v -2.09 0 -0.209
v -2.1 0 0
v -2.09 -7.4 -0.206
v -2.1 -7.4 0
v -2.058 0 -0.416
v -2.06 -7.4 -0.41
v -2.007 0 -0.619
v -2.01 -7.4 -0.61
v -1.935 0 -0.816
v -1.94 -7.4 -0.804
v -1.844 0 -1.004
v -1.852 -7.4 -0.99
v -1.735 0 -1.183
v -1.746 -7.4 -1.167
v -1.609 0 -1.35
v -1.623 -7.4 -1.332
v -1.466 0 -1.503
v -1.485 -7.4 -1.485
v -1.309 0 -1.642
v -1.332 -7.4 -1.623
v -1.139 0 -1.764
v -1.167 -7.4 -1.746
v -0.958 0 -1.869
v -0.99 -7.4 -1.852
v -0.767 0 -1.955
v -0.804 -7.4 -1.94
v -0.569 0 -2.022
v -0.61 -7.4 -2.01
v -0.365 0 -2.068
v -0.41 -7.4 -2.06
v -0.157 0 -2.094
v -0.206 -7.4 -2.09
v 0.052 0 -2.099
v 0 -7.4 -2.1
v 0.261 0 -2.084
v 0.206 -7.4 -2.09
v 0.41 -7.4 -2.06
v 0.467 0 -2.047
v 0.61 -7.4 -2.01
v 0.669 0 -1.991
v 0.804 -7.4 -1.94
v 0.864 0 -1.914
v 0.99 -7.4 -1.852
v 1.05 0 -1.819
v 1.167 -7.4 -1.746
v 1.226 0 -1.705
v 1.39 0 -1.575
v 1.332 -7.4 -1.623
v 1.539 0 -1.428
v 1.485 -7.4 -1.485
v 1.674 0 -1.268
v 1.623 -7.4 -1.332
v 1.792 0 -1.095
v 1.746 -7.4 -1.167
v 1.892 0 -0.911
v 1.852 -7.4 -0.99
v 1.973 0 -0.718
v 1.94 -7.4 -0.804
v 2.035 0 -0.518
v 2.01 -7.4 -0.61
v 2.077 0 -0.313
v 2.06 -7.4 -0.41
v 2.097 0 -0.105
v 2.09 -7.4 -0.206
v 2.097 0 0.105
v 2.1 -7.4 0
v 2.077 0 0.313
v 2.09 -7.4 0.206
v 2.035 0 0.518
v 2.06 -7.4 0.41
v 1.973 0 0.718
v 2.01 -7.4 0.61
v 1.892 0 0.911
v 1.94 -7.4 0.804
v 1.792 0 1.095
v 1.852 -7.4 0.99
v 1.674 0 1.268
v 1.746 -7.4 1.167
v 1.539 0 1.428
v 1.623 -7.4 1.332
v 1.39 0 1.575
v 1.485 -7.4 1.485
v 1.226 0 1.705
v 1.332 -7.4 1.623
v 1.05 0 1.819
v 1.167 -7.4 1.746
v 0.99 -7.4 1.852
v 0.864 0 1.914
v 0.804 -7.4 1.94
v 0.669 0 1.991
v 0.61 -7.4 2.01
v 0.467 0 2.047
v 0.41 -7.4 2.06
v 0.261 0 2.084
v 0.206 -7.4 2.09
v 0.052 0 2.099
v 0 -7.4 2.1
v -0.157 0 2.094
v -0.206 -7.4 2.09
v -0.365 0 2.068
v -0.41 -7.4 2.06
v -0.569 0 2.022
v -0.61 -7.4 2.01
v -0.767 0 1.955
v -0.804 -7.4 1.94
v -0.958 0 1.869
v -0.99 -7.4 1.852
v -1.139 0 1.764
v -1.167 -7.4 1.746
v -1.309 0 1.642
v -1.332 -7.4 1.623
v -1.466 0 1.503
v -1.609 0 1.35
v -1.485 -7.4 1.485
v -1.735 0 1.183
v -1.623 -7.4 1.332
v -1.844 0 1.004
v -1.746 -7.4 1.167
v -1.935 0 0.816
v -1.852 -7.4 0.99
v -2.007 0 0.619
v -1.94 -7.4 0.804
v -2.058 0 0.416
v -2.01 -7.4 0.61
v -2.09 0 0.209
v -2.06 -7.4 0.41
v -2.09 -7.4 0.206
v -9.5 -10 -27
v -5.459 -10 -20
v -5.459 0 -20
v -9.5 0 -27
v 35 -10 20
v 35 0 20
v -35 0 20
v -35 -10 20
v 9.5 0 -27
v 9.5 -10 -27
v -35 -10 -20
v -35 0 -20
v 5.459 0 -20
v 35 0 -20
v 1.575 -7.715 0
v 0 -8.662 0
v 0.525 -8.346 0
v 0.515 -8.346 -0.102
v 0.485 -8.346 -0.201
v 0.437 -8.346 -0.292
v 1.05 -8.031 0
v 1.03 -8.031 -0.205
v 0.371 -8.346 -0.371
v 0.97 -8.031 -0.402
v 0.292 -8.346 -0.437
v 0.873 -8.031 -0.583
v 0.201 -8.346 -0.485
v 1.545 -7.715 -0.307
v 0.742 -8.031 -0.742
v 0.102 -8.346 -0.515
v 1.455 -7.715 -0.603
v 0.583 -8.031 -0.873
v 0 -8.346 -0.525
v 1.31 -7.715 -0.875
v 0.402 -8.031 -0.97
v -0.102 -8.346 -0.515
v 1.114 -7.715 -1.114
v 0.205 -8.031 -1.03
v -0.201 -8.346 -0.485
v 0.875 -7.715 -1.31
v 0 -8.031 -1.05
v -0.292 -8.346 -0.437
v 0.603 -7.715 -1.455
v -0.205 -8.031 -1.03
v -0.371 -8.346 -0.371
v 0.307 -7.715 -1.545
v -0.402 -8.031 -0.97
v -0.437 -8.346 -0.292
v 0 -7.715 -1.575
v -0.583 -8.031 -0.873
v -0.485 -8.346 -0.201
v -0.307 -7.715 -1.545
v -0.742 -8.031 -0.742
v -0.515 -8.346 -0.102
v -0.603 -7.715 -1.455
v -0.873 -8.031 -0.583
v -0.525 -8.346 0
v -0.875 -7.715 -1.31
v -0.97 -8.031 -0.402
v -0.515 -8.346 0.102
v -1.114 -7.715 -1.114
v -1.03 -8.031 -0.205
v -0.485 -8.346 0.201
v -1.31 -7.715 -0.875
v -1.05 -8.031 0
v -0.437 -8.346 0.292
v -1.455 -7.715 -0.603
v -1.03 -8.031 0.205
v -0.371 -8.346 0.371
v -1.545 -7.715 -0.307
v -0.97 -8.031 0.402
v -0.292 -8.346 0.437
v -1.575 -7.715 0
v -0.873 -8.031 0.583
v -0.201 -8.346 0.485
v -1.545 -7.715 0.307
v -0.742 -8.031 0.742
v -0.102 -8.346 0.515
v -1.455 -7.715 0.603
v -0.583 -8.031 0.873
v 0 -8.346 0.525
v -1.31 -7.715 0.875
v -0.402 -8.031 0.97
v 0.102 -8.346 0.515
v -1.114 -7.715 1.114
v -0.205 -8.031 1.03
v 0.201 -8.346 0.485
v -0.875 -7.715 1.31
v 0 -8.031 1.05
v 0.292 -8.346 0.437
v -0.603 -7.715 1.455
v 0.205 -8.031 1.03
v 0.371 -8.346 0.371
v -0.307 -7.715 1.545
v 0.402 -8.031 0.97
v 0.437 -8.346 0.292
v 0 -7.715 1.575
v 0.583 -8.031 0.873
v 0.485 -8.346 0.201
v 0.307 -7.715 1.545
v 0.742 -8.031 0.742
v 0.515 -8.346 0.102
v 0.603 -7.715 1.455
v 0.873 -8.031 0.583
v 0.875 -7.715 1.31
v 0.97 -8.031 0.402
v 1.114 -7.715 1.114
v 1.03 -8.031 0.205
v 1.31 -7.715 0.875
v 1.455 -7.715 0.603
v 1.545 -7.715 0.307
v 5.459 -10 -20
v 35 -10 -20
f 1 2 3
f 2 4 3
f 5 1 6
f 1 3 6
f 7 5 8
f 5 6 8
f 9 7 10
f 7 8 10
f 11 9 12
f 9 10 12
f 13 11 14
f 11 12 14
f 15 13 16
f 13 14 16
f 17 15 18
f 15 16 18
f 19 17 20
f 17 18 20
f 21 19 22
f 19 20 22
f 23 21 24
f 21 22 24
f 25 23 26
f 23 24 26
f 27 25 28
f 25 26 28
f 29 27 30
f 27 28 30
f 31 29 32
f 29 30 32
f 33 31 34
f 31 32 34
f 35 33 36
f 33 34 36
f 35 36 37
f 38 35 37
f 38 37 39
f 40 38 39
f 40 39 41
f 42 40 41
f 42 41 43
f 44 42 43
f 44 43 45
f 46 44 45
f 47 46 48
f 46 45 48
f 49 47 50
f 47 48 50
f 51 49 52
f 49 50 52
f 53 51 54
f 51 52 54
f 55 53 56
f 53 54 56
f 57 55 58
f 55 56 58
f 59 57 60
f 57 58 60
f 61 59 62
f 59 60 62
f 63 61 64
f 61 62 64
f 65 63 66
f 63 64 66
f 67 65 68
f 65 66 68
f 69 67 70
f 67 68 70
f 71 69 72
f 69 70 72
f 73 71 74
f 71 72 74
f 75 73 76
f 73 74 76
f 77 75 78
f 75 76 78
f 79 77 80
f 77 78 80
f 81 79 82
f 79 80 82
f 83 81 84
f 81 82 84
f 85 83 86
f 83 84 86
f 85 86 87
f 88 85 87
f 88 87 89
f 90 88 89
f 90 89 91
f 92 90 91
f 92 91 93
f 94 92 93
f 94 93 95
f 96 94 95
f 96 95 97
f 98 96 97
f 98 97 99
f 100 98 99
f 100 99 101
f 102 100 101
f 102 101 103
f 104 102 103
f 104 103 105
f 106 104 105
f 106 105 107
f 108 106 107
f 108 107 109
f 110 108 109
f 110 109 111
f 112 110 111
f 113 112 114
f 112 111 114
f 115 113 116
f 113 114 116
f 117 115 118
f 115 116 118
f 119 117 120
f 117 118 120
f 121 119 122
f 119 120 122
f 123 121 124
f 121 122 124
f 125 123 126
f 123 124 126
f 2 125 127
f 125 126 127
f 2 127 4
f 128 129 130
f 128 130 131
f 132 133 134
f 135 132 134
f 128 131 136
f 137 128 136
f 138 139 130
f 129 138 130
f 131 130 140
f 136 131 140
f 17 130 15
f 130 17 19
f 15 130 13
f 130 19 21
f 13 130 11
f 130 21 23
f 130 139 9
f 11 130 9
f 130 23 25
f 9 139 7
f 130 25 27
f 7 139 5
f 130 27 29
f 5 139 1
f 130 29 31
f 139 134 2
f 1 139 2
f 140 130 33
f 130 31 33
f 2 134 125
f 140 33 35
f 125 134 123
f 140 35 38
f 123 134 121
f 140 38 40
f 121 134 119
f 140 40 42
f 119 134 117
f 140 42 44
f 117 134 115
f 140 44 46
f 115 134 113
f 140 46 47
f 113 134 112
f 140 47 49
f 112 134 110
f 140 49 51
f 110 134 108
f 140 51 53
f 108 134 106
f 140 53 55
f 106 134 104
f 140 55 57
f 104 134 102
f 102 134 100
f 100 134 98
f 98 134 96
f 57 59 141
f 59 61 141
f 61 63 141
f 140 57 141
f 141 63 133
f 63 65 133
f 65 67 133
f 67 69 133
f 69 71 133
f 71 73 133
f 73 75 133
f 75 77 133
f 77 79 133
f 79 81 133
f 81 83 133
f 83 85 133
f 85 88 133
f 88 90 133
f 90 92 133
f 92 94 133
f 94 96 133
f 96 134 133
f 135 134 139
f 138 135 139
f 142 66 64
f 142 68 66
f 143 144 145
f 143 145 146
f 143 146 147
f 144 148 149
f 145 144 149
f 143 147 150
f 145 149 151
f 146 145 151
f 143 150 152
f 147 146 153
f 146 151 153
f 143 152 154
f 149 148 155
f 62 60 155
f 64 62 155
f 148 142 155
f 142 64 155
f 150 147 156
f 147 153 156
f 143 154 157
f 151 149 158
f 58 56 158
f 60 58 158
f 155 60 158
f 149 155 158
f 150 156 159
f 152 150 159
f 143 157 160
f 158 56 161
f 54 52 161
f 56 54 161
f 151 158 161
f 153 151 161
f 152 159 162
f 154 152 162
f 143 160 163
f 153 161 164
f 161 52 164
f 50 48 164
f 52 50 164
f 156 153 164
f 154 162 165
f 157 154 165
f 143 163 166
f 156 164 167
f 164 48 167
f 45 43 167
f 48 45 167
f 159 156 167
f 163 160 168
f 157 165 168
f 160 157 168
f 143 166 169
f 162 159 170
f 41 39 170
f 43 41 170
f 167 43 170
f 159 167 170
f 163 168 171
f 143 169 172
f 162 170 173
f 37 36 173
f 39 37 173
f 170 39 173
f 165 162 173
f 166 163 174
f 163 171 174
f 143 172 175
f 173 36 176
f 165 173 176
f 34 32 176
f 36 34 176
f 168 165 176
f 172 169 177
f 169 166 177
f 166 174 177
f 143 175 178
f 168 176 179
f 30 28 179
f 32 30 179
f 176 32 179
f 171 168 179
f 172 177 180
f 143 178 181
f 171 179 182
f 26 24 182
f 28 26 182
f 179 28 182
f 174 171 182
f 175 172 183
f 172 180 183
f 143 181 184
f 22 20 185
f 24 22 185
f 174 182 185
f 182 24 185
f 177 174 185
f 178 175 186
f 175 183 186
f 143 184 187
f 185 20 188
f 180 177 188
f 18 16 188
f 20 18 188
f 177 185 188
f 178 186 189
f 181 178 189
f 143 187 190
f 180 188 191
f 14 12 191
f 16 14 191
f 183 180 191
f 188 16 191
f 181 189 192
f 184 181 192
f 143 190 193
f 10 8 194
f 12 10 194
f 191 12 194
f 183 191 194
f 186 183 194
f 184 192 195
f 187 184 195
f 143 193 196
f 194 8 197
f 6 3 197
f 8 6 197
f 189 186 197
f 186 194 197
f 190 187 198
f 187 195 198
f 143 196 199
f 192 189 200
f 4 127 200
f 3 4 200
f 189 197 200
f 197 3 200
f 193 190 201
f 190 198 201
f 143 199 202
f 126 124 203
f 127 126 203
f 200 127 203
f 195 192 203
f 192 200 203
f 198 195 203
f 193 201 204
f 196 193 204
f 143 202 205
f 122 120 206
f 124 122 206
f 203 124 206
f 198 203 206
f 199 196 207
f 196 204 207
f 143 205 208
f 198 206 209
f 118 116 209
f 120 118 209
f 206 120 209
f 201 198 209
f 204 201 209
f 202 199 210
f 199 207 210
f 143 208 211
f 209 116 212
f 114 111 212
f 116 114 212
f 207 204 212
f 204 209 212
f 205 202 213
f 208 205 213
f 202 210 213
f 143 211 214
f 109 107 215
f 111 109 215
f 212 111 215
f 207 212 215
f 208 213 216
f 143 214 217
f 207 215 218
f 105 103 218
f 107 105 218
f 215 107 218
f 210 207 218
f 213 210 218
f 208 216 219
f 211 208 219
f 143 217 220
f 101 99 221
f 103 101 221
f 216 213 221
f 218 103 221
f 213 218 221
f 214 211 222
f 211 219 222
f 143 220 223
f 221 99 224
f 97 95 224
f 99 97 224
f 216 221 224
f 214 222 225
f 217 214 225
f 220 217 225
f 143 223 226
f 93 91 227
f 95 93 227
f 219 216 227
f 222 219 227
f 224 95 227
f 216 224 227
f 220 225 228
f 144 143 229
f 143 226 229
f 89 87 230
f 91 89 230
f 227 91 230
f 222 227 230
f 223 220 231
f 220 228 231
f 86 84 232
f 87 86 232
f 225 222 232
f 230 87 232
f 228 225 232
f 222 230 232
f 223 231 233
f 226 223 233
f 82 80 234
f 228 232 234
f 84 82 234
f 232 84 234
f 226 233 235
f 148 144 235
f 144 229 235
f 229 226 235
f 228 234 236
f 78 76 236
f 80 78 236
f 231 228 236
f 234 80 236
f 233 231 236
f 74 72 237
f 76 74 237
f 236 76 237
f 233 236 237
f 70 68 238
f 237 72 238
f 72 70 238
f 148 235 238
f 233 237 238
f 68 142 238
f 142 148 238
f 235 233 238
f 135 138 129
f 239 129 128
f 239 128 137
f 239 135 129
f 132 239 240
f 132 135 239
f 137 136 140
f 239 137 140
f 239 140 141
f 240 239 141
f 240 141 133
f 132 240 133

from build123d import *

# Parameters (mm, degrees)
F1_DEPTH = 10
F2_D     = 4.2
F2_DEPTH = 7.4
F2_TIP   = 1.2618073


with BuildPart() as f1:
    # F0 (on Front) → F1 (new body)
    with BuildSketch(Plane.XZ):
        Polygon((35, -20), (35, 0), (35, 20), (-35, 20), (-35, -20), (-5.4585481157, -20), (-9.5, -27), (0, -27), (9.5, -27), (5.4585481157, -20), align=None)
    extrude(amount=F1_DEPTH)

    # F2
    with Locations(Plane(origin=(0, 0, 0), x_dir=(1, 0, 0), z_dir=(0, 1, 0))):
        with Locations((0, 0)):
            Hole(F2_D / 2, depth=F2_DEPTH)
            with Locations((0, 0, -(F2_DEPTH + F2_TIP / 2))):  # 118° drill point
                Cone(0, F2_D / 2, F2_TIP, mode=Mode.SUBTRACT)


solid = f1.part
